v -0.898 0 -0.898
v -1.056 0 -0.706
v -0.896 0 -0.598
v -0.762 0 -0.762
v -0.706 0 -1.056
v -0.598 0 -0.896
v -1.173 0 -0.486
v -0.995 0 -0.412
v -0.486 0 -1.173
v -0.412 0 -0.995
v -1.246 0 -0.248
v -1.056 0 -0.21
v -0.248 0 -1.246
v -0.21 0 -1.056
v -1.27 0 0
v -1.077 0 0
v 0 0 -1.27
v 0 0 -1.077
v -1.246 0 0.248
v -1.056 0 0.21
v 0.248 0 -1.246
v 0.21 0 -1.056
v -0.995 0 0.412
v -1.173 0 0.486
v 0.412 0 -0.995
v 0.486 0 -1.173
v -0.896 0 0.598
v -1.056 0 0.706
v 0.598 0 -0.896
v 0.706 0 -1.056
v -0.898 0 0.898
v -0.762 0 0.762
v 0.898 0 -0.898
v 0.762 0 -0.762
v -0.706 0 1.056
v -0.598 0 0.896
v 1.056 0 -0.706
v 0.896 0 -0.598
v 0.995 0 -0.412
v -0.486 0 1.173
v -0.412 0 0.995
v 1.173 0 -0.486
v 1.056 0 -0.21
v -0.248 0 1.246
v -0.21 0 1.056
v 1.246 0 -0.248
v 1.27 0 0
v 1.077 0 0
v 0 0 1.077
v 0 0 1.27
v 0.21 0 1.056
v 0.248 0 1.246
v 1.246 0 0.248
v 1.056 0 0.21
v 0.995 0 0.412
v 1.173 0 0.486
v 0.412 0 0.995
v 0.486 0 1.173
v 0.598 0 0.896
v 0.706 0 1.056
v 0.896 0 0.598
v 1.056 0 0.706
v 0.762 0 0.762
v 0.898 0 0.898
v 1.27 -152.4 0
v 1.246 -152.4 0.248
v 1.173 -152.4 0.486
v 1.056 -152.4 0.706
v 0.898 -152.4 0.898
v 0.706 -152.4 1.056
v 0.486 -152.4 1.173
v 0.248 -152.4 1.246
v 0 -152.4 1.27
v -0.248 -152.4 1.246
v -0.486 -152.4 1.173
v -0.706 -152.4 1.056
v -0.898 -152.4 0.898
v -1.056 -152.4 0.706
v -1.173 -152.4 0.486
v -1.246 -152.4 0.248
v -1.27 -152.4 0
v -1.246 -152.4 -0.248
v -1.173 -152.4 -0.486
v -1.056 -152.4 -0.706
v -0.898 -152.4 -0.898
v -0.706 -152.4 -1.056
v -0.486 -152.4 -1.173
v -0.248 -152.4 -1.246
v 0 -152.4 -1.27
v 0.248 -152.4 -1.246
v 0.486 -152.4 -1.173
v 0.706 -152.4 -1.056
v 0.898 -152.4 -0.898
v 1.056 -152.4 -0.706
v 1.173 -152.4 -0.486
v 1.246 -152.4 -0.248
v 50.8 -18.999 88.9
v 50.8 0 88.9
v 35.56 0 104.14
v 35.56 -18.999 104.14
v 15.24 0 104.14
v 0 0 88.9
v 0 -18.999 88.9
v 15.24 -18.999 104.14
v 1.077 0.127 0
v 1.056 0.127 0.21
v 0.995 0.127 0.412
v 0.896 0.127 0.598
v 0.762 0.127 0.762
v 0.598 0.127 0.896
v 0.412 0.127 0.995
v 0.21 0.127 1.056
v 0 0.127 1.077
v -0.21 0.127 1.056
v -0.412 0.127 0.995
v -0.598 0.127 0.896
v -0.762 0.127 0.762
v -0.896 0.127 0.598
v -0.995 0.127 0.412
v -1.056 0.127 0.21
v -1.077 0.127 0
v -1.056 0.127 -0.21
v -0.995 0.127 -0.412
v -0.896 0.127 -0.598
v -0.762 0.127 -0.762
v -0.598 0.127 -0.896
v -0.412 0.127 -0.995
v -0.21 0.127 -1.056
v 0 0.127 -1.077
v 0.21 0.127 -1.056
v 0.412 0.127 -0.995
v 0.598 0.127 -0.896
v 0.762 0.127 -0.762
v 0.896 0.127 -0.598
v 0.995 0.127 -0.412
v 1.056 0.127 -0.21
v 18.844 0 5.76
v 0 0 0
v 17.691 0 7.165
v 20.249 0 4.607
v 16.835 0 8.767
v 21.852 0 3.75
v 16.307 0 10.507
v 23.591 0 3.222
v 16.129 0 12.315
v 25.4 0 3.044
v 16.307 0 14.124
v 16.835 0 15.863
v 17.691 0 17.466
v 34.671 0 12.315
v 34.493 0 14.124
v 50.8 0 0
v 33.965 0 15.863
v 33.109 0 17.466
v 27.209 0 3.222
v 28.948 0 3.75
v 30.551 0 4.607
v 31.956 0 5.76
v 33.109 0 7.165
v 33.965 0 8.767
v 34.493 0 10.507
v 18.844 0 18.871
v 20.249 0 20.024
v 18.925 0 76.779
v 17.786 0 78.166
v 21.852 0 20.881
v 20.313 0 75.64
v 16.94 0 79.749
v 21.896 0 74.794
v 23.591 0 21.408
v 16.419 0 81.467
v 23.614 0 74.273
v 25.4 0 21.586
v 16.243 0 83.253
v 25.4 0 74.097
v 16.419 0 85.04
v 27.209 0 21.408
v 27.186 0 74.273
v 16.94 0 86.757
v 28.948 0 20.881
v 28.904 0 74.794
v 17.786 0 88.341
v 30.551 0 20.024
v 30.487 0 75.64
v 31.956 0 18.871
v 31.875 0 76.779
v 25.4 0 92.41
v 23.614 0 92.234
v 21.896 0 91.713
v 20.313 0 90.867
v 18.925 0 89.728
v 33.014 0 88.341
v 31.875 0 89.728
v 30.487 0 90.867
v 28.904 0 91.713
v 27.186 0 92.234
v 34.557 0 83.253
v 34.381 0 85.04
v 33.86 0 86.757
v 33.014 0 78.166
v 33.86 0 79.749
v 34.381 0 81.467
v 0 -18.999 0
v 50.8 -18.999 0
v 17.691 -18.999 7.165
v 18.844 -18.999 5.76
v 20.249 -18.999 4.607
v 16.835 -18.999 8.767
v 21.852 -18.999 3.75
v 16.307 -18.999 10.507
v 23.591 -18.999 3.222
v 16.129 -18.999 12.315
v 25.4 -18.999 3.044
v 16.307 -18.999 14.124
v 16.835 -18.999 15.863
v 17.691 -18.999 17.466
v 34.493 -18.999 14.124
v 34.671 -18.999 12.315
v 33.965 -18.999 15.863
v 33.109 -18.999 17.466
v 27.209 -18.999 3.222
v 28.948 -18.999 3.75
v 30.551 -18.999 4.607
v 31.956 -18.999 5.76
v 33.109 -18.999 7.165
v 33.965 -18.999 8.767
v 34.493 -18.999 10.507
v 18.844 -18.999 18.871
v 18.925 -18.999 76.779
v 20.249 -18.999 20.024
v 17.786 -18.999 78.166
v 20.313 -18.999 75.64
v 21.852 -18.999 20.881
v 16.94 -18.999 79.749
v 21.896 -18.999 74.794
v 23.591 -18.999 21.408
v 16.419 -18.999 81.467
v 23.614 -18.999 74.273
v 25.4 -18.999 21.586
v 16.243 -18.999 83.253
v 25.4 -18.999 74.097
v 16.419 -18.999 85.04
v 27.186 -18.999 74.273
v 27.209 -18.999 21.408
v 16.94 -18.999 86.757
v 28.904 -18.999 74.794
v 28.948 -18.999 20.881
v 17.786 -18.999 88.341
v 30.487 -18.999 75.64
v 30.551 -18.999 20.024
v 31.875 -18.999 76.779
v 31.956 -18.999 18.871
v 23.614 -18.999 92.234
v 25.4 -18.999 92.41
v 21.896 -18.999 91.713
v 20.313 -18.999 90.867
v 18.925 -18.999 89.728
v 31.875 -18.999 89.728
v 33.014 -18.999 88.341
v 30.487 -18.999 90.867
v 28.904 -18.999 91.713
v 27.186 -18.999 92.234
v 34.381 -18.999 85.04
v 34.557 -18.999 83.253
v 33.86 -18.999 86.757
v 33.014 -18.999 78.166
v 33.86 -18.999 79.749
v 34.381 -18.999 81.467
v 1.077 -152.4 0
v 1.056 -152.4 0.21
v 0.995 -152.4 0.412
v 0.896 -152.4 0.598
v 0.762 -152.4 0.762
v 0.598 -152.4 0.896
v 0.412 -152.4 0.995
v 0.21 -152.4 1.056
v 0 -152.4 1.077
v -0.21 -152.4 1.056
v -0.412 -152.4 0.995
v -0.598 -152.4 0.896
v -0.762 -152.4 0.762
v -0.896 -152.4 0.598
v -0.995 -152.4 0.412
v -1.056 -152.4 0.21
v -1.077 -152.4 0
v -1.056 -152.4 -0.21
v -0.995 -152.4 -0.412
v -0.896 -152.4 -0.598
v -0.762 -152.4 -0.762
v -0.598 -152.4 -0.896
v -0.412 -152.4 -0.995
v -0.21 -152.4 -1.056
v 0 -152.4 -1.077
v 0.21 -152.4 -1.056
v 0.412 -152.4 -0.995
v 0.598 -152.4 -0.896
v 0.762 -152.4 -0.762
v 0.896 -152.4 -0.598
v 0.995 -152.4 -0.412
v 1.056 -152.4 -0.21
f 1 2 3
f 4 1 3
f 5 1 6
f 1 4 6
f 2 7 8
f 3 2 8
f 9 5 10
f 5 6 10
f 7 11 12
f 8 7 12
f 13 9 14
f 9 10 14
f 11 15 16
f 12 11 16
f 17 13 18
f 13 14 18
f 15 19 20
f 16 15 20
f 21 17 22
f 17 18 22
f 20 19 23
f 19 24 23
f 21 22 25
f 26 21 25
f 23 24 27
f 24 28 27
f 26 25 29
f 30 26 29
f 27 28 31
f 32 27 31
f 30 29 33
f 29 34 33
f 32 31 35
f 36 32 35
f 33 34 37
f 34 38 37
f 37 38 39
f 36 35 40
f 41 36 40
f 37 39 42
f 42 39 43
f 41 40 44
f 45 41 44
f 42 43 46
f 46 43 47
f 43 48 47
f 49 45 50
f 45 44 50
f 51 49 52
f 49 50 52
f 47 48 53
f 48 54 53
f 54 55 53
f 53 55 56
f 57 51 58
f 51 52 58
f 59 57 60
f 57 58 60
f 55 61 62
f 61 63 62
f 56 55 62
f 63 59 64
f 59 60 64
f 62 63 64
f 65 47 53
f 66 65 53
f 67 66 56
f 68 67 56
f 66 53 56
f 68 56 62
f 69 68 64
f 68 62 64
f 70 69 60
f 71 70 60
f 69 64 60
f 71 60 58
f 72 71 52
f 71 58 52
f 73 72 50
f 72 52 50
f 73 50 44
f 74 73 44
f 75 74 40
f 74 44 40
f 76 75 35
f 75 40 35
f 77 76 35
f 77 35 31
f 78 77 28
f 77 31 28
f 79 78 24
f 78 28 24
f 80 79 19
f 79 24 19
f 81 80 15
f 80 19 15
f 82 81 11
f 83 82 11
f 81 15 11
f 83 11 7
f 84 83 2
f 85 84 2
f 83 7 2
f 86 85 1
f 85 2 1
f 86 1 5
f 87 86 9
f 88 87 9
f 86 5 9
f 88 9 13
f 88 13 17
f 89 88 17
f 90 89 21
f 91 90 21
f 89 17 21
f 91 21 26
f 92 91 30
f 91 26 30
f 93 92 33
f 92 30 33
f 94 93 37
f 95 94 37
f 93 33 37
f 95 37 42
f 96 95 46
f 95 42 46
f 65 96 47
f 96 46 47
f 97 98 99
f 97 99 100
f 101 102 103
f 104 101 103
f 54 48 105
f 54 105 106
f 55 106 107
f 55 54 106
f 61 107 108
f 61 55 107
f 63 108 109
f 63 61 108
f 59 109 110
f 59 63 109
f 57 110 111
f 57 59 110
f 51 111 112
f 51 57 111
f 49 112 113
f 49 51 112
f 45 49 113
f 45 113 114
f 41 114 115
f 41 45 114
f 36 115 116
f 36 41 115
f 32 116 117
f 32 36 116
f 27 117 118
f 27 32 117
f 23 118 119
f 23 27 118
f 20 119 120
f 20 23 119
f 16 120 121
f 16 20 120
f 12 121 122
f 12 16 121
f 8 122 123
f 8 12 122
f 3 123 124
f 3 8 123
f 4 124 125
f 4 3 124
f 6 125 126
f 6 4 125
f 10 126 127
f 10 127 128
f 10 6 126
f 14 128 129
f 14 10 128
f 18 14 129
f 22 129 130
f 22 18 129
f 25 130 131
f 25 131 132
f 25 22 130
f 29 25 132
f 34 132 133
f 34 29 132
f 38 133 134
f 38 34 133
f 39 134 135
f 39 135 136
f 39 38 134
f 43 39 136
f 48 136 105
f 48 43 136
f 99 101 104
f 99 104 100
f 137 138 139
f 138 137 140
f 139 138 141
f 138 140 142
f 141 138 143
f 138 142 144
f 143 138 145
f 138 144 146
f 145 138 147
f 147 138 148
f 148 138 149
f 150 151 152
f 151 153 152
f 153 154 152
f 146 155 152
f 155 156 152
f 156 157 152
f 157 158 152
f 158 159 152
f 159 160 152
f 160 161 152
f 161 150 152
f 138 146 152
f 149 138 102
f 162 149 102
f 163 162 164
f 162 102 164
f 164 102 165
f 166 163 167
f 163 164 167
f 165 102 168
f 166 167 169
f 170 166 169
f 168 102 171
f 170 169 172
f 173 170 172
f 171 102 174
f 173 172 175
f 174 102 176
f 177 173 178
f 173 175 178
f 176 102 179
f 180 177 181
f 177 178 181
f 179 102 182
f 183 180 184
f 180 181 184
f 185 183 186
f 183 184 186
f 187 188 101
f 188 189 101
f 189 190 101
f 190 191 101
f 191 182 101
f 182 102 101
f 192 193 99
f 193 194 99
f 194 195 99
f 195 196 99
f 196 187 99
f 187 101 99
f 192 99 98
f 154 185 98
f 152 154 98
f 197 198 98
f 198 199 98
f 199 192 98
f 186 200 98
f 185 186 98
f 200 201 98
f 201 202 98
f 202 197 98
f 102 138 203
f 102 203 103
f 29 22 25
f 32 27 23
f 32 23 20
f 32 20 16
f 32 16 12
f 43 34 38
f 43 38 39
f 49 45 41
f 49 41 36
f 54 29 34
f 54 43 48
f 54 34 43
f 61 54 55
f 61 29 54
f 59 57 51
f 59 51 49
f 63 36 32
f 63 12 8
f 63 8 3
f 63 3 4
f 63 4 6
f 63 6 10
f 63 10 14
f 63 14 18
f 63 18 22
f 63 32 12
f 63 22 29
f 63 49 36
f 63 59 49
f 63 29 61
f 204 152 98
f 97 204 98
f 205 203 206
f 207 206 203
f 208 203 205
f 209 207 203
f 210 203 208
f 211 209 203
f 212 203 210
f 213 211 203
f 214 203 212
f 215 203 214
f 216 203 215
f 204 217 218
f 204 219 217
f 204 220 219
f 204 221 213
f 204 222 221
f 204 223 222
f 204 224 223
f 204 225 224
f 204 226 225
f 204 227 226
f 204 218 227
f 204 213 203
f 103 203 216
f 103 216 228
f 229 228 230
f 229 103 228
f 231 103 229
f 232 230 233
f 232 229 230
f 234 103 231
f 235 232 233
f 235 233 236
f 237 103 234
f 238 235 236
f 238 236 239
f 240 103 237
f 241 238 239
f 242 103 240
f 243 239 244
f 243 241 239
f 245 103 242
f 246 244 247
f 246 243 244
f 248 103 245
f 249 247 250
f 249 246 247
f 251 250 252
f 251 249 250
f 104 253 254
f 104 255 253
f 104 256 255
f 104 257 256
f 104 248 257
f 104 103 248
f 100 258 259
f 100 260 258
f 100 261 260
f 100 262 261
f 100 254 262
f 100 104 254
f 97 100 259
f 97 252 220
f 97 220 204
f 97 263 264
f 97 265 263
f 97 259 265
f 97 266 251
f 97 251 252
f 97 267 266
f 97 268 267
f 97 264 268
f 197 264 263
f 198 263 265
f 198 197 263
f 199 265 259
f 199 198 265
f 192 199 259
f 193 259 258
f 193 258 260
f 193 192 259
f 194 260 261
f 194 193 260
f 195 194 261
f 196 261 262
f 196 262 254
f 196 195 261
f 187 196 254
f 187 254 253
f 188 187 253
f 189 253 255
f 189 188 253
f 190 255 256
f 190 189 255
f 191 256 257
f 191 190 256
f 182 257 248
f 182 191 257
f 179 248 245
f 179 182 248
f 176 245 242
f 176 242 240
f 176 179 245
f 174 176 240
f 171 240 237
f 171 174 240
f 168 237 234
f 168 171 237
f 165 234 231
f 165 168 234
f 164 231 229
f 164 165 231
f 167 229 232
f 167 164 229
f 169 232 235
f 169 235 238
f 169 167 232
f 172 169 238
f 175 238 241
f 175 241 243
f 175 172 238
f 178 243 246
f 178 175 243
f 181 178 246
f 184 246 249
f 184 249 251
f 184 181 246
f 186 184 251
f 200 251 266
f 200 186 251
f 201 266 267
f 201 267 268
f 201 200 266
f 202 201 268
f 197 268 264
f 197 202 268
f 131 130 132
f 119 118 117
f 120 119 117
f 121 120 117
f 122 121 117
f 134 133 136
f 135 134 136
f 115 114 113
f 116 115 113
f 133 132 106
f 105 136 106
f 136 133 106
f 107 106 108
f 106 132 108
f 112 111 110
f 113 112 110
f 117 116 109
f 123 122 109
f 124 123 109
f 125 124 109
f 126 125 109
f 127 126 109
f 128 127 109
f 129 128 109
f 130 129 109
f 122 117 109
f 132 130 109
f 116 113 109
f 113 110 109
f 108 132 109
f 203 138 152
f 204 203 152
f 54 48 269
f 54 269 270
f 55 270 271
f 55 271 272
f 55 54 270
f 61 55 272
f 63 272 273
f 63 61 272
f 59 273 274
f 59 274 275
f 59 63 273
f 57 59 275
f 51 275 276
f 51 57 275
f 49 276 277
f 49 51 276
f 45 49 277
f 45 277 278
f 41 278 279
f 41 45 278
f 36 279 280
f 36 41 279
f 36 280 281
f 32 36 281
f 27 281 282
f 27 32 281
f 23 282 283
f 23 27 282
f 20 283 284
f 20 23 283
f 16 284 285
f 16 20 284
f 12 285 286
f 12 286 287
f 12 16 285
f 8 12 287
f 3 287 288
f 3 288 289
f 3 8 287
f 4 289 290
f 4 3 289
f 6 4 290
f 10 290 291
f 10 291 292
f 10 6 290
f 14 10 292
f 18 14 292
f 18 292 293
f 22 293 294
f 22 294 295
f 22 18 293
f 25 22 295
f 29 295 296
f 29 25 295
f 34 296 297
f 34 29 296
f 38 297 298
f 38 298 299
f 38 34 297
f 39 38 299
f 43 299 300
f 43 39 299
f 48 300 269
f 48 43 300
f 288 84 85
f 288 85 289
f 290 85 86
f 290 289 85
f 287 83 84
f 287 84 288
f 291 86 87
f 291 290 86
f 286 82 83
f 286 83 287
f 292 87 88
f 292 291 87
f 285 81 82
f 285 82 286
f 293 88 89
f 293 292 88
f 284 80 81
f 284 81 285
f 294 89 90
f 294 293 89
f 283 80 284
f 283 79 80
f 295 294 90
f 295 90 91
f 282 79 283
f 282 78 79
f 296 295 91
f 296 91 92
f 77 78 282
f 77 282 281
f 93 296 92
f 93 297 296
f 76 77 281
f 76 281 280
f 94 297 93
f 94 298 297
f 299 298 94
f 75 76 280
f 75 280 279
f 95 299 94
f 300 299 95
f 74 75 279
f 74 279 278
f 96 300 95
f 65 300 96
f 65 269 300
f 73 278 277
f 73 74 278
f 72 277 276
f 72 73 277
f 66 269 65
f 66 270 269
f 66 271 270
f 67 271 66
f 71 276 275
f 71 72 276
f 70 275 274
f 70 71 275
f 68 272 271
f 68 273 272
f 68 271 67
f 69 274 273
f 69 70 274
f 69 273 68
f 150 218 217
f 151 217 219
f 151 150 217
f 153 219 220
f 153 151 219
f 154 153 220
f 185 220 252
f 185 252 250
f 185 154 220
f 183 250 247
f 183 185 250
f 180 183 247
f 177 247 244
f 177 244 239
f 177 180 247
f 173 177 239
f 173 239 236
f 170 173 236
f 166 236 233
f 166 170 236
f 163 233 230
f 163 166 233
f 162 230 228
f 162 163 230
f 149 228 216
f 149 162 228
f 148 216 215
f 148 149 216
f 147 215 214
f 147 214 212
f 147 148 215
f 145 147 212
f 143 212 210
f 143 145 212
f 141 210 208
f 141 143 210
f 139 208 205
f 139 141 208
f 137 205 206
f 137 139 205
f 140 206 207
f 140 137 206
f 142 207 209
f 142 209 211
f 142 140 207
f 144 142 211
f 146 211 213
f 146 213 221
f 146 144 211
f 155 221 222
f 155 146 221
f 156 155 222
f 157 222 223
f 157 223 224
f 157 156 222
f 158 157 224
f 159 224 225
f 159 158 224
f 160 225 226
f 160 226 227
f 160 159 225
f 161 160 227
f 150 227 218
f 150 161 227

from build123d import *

# Parameters (mm, degrees)
F0_R     = 1.27
F0_R_2   = 1.077195
F1_DEPTH = 152.4
F2_DEPTH = 0.127
F3_W     = 50.8
F3_H     = 104.14
F3_R     = 9.271
F3_R_2   = 9.1567
F4_DEPTH = 18.9992
F5_SIZE  = 15.24
F6_SIZE  = 15.24


with BuildPart() as f1:
    # F0 (on Front) → F1 (new body)
    with BuildSketch(Plane.XZ):
        Circle(F0_R)
        Circle(F0_R_2, mode=Mode.SUBTRACT)
    extrude(amount=F1_DEPTH)


with BuildPart() as f2:
    # F0 (on Front) → F2 (new body)
    with BuildSketch(Plane.XZ):
        Circle(F0_R_2)
    extrude(amount=-F2_DEPTH)


with BuildPart() as f4:
    # F3 (on Front) → F4 (new body)
    with BuildSketch(Plane.XZ):
        with Locations((25.4, 52.07)):
            Rectangle(F3_W, F3_H)
        with Locations((25.4, 12.315327)):
            Circle(F3_R, mode=Mode.SUBTRACT)
        with Locations((25.4, 83.253346)):
            Circle(F3_R_2, mode=Mode.SUBTRACT)
    extrude(amount=F4_DEPTH)

    # F5
    f5_edges = [f4.edges().sort_by_distance(p)[0] for p in [
        (50.8, -9.4996, 104.14),
    ]]
    chamfer(f5_edges, length=F5_SIZE)

    # F6
    f6_edges = [f4.edges().sort_by_distance(p)[0] for p in [
        (0, -9.4996, 104.14),
    ]]
    chamfer(f6_edges, length=F6_SIZE)


solid = Compound([f1.part, f2.part, f4.part])
